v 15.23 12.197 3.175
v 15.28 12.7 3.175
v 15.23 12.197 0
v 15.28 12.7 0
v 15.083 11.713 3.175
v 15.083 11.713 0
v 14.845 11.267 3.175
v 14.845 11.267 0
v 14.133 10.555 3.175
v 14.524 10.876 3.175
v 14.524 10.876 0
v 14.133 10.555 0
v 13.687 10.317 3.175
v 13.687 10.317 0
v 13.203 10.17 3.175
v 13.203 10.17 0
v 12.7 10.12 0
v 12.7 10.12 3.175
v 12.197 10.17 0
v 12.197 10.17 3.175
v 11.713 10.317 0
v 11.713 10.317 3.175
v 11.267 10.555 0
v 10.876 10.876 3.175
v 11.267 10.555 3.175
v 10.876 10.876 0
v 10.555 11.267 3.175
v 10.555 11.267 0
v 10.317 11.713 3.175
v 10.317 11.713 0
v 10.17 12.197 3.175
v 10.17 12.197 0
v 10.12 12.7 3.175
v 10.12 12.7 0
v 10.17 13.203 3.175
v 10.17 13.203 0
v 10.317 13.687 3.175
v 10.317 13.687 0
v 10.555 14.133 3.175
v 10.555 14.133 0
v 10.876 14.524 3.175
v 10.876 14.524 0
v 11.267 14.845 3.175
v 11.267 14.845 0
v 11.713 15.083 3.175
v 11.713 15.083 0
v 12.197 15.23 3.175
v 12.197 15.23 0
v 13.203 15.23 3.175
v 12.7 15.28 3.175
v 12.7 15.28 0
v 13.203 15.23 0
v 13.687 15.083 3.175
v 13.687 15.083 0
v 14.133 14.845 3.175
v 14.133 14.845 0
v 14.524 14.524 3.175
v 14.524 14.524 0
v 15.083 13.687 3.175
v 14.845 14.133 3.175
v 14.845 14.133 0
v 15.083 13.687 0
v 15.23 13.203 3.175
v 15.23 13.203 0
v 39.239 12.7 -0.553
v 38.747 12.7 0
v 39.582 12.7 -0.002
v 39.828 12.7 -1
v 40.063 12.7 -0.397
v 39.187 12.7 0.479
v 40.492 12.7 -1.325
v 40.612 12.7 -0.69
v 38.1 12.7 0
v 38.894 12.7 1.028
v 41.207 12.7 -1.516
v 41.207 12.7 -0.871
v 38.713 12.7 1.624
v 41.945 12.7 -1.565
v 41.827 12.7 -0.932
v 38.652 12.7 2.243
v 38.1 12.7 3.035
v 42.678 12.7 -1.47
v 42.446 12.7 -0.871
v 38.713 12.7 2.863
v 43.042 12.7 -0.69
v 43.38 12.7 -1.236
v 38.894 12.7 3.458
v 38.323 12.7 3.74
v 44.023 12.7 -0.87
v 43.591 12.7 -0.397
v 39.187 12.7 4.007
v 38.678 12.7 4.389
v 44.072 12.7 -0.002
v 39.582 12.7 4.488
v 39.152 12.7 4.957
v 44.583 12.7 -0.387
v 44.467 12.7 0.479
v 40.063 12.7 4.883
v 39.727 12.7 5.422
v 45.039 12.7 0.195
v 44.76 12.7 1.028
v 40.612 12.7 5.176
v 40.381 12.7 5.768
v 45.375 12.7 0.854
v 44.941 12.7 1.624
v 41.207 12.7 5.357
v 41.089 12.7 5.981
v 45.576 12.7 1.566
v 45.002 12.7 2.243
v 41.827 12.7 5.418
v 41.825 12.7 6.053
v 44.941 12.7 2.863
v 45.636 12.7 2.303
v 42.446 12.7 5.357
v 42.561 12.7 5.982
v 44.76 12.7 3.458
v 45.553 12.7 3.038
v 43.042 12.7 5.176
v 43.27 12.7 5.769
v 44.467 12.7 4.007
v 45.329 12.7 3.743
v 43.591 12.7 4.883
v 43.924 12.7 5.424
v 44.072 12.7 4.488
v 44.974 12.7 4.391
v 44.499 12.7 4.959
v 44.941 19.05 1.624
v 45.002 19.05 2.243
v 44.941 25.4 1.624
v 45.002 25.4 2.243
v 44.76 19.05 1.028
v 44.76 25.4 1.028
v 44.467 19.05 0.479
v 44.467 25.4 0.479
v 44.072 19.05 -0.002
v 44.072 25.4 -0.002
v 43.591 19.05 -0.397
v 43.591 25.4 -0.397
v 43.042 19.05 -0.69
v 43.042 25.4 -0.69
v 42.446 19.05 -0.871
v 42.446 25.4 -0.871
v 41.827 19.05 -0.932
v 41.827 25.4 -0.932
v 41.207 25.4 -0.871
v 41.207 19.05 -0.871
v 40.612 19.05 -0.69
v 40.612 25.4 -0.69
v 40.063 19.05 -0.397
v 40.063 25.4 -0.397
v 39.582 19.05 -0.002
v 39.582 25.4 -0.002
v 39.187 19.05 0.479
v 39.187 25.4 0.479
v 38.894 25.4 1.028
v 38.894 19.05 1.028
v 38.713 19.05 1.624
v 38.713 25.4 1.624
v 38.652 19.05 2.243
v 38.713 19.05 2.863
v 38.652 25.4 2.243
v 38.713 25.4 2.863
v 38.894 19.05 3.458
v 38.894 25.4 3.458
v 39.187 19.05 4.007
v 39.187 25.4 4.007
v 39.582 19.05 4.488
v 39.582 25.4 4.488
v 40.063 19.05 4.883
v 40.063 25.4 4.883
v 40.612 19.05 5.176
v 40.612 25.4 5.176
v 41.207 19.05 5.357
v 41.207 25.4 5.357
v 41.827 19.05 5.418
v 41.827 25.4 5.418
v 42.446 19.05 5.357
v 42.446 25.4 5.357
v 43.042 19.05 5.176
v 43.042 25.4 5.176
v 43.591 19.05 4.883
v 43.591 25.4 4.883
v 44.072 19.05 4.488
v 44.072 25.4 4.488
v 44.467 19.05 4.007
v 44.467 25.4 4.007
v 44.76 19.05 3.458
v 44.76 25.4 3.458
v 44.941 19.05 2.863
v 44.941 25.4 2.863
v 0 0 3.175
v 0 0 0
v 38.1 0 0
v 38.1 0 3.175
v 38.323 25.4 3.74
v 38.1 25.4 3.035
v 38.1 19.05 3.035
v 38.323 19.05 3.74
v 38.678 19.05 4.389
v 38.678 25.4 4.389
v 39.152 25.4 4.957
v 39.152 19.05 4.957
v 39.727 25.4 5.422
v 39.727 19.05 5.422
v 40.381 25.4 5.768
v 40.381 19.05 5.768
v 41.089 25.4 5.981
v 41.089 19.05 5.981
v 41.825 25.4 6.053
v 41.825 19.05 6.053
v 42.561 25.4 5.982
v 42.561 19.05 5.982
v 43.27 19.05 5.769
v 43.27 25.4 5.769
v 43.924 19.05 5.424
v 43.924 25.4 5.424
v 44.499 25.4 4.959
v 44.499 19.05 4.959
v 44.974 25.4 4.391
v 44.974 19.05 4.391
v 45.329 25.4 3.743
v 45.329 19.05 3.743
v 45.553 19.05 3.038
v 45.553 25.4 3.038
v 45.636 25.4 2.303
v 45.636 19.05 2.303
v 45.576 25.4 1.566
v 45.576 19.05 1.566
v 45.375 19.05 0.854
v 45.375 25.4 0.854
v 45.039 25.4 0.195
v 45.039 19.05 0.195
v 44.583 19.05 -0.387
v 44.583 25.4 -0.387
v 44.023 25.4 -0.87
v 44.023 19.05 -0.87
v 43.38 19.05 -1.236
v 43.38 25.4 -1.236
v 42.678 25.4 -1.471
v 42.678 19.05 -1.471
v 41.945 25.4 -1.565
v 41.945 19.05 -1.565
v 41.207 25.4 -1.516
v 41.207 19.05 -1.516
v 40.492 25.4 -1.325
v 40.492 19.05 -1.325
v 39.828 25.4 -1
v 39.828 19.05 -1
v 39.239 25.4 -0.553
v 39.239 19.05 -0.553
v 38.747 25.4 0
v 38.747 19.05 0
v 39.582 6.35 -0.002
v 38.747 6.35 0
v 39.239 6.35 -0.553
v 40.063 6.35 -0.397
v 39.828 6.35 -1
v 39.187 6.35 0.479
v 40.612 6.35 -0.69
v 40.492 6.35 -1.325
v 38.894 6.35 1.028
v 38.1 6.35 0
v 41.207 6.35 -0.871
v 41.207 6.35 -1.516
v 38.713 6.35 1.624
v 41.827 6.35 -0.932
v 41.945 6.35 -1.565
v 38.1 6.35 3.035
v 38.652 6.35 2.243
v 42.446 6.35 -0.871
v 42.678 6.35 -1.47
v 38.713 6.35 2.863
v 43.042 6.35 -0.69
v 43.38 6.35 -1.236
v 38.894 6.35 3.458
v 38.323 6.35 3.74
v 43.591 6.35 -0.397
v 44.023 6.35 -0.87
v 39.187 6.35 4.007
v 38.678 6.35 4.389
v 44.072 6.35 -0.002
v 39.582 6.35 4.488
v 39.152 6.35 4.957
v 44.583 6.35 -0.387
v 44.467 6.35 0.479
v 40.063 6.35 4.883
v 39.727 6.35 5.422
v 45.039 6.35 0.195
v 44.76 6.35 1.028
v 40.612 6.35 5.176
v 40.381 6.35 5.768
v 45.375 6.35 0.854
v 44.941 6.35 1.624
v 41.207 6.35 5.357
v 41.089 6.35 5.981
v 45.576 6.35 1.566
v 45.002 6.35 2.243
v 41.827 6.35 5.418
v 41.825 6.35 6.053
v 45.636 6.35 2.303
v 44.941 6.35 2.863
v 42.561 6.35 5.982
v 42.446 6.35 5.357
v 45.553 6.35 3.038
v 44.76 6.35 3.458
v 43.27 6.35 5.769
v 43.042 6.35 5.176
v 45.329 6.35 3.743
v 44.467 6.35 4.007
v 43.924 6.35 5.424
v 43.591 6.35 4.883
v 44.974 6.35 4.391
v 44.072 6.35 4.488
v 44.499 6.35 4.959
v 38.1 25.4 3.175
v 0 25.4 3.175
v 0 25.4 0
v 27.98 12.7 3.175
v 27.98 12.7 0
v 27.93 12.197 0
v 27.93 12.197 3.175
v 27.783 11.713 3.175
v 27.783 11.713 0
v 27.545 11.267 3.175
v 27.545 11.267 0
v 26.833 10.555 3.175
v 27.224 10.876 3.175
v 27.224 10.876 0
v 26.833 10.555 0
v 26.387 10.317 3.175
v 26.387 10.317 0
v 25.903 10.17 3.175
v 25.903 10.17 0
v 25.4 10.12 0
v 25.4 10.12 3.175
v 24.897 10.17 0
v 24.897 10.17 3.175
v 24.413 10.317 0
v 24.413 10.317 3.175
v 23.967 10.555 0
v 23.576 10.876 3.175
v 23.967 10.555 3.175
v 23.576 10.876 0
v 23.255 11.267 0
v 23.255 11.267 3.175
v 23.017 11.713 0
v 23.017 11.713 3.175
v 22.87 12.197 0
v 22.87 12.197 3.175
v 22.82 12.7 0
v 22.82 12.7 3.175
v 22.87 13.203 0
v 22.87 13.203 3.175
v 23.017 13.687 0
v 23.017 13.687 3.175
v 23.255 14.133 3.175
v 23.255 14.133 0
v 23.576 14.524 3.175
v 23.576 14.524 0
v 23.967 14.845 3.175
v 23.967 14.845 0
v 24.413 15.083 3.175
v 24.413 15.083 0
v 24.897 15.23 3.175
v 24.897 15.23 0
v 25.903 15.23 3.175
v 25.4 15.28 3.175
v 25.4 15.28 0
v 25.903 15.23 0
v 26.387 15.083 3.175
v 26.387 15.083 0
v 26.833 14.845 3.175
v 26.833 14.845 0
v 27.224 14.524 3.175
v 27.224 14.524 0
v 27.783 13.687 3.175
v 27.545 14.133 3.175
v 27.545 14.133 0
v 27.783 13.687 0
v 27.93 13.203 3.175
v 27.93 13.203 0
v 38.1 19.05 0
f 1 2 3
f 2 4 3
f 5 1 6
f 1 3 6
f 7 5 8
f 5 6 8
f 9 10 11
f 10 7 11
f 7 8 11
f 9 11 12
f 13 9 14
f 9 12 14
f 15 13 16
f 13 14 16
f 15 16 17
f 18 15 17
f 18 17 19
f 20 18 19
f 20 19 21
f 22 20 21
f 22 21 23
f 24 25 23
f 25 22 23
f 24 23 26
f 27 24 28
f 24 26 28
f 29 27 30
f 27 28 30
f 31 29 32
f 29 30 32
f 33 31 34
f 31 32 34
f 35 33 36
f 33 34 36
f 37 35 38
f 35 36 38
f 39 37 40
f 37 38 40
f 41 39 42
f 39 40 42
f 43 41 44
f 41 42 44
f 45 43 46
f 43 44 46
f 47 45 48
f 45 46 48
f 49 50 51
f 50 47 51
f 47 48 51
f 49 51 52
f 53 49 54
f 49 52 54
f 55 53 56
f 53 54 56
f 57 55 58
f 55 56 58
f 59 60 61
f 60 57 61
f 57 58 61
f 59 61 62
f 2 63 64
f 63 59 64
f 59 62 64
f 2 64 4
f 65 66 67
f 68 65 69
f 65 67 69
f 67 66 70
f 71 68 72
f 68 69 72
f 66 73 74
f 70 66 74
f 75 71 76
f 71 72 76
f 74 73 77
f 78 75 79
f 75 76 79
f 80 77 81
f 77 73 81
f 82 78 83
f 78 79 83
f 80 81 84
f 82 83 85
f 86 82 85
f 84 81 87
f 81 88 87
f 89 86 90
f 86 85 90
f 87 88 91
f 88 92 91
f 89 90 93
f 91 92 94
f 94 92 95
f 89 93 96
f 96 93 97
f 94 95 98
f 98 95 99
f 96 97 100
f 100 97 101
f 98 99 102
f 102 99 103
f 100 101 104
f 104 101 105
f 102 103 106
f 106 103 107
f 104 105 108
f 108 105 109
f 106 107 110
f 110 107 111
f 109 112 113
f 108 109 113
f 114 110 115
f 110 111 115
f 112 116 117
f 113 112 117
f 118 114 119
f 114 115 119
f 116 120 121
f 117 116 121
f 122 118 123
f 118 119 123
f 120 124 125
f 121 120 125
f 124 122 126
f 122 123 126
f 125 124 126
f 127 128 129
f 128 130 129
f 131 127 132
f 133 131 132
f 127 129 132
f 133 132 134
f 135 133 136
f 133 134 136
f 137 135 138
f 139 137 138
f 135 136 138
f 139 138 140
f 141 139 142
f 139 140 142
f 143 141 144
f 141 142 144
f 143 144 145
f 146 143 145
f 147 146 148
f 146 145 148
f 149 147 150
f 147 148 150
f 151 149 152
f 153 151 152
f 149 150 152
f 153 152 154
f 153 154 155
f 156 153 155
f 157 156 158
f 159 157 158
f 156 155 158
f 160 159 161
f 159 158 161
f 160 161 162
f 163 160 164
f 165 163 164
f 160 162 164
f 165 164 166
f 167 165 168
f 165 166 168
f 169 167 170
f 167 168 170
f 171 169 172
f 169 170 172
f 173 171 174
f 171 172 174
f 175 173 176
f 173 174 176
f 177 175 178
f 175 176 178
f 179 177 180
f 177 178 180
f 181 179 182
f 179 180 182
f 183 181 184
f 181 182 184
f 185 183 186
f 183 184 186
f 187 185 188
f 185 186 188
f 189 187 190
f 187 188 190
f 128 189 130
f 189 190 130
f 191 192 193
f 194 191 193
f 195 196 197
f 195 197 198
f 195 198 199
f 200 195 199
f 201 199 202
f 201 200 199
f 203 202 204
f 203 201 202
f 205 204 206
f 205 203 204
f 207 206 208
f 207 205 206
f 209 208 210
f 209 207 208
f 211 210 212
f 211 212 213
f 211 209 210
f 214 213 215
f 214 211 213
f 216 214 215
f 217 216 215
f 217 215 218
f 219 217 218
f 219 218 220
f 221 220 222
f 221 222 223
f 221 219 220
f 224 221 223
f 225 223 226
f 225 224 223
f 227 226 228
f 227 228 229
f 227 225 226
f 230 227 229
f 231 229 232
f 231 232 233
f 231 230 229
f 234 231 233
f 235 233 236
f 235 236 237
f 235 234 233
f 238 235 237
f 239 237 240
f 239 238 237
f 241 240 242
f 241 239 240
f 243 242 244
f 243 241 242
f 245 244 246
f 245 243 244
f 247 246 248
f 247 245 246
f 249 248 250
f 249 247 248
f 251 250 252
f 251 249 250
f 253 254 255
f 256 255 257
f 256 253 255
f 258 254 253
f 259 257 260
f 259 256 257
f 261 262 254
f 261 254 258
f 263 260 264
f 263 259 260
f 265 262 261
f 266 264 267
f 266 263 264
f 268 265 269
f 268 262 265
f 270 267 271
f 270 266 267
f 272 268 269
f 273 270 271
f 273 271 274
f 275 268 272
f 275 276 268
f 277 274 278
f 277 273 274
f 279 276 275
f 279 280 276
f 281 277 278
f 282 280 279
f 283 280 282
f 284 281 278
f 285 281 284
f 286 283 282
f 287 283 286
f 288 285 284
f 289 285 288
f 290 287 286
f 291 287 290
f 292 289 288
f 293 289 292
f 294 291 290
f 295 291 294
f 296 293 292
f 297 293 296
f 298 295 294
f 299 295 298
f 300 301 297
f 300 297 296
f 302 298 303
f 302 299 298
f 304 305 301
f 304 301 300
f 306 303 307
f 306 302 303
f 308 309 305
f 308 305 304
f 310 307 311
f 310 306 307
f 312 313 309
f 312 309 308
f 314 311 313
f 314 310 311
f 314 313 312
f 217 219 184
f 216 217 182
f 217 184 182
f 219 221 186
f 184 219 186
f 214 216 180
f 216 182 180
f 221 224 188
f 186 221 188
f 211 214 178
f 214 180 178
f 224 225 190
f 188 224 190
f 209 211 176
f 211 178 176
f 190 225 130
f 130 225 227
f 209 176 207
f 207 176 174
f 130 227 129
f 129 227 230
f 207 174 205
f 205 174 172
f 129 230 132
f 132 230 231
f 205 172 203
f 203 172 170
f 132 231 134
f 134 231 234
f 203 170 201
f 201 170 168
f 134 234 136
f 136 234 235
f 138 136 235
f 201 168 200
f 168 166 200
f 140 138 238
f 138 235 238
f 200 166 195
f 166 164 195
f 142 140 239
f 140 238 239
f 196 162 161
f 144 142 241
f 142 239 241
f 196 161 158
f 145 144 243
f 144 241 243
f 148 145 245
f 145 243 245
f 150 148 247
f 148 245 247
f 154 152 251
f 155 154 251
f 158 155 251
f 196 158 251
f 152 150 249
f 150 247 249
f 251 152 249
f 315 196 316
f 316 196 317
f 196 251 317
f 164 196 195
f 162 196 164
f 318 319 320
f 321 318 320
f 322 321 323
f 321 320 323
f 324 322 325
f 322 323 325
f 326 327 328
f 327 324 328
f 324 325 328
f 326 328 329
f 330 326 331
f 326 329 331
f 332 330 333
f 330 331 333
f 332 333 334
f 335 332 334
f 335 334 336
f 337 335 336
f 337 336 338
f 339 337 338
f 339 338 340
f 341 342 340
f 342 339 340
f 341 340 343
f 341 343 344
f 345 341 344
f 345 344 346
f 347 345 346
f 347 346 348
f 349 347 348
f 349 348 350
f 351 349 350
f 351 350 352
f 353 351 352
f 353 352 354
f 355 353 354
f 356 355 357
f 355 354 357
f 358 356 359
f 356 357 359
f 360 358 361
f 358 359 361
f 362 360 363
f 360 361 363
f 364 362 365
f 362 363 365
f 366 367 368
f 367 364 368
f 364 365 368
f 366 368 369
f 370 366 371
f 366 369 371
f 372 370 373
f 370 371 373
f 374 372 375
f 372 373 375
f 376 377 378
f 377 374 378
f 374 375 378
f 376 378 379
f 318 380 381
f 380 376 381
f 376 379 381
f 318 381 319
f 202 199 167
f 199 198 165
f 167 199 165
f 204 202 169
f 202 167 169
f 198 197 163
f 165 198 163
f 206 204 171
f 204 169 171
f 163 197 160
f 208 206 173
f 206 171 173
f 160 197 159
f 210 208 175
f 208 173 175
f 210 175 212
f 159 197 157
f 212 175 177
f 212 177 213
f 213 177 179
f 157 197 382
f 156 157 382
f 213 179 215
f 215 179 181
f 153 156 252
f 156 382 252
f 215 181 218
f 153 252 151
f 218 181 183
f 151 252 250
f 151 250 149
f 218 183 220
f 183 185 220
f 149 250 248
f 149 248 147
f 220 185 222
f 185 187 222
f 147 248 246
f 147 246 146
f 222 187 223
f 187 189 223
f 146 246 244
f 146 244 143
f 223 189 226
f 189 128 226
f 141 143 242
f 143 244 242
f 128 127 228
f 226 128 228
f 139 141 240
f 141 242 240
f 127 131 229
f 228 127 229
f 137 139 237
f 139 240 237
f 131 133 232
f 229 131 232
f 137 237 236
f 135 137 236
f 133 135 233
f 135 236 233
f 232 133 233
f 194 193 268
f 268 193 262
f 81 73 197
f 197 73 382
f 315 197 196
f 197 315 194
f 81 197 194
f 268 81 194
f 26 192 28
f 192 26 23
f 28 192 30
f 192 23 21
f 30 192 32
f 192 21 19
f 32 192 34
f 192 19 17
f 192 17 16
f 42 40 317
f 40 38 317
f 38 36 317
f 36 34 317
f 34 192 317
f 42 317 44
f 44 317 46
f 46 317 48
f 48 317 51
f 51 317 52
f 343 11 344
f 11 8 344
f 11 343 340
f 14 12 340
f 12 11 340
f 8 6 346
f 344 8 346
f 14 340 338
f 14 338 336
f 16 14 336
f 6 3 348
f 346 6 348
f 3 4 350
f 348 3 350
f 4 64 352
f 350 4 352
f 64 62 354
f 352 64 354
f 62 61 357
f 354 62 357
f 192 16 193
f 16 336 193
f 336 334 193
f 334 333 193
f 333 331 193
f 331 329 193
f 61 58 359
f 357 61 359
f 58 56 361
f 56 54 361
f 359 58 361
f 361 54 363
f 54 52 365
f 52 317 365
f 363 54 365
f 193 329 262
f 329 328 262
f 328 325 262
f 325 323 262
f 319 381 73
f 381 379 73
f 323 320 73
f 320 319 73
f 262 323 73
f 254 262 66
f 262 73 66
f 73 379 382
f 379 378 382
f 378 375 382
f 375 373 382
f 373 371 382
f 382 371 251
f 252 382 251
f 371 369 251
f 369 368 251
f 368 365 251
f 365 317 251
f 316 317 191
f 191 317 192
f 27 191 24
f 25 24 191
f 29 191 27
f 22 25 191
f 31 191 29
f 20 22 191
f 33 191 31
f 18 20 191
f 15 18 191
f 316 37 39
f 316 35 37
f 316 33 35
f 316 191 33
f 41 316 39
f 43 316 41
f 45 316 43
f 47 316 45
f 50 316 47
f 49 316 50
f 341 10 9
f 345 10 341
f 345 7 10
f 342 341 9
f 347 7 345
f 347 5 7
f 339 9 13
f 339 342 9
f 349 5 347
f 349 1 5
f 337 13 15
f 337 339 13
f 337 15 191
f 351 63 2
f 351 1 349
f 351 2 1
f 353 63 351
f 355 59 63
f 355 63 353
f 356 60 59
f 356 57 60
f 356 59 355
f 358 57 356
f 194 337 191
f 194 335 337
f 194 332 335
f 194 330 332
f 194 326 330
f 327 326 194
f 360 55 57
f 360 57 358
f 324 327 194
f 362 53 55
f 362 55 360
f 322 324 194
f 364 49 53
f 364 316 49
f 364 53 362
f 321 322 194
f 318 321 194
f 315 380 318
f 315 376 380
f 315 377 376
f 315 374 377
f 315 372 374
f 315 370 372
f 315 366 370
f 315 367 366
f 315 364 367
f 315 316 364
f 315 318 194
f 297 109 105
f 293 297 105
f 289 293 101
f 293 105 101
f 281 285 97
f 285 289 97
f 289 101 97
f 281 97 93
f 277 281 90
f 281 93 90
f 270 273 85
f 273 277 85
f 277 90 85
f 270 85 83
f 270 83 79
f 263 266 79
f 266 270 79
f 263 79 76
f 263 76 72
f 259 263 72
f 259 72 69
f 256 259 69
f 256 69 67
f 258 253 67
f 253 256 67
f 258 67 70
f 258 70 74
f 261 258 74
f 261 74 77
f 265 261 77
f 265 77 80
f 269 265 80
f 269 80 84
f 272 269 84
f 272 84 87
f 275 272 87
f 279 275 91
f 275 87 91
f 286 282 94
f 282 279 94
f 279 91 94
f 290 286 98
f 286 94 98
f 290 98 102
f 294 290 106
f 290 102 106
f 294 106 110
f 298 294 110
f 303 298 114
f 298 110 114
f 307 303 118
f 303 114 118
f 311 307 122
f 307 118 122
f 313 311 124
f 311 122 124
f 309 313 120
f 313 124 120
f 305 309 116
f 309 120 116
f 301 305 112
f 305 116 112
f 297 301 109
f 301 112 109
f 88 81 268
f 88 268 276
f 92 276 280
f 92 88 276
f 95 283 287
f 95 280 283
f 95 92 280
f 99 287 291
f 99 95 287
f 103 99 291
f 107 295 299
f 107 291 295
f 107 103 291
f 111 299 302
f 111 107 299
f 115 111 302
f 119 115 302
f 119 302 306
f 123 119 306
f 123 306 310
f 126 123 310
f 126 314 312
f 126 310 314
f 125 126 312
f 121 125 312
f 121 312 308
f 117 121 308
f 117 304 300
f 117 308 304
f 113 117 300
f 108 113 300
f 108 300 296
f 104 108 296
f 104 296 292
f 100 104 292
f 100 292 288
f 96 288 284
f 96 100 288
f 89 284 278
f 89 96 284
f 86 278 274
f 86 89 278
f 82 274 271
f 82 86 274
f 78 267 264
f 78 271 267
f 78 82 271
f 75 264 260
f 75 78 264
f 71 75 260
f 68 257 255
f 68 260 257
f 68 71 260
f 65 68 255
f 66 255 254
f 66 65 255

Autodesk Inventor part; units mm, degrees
ref_plane "YZ Plane" through (0, 0, 0) normal (1, 0, 0) x (0, 1, 0)
ref_plane "XZ Plane" through (0, 0, 0) normal (0, 1, 0) x (-1, 0, 0)
sketch "Sketch1" plane through (0, 0, 0) normal (0, 0, 1) x (1, 0, 0)
  line L0 (0, 0) -> (38.1, 0)
  line L1 (38.1, 0) -> (38.1, 25.4)
  line L2 (38.1, 25.4) -> (0, 25.4)
  line L3 (0, 25.4) -> (0, 0)
  line L4 (0, 12.7) -> (12.7, 12.7) construction
  line L5 (12.7, 12.7) -> (25.4, 12.7) construction
  circle A0 centre (12.7, 12.7) radius 2.5797
  circle A1 centre (25.4, 12.7) radius 2.5797
  dimension "d0" = 38.1
  dimension "d1" = 25.4
  dimension "d2" = 12.7
  dimension "d3" = 12.7
  dimension "d4" = 5.1594
  dimension "d5" = 5.1594
extrude "Extrusion1" add sketch "Sketch1" along normal blind 3.175
sketch "Sketch2" plane through (0, 25.4, 0) normal (0, 1, 0) x (1, 0, 0)
  circle A0 centre (41.8269, -2.2431) radius 3.175
  arc A1 (38.1, -3.0347) -> (38.7472, 0) centre (41.8269, -2.2431) ccw
  line L0 (0, 0) -> (38.1, 0) projected
  line L1 (38.7472, 0) -> (38.1, 0)
  line L2 (38.1, 0) -> (38.1, -3.175) projected
  line L3 (38.1, 0) -> (38.1, -3.175)
  dimension "d8" = 6.35
  dimension "d9" = 7.62
extrude "Extrusion2" add sketch "Sketch2" against normal blind 6.35
ref_plane "Work Plane1" through (0, 12.7, 0) normal (0, -1, 0) x (1, 0, 0)
sketch "Sketch3" plane through (0, 12.7, 0) normal (0, -1, 0) x (1, 0, 0)
  arc A0 (38.7472, 0) -> (38.1, 3.0347) centre (41.8269, 2.2431) ccw projected
  circle A1 centre (41.8269, 2.2431) radius 3.175 projected
  line L0 (38.1, 0) -> (38.7472, 0) projected
  line L1 (38.1, 0) -> (38.1, 3.0347) projected
  line L2 (38.1, 3.0347) -> (38.1, 0)
  point P0 (0, 0)
extrude "Extrusion3" add sketch "Sketch3" along normal blind 6.35
properties part number "hinge"
